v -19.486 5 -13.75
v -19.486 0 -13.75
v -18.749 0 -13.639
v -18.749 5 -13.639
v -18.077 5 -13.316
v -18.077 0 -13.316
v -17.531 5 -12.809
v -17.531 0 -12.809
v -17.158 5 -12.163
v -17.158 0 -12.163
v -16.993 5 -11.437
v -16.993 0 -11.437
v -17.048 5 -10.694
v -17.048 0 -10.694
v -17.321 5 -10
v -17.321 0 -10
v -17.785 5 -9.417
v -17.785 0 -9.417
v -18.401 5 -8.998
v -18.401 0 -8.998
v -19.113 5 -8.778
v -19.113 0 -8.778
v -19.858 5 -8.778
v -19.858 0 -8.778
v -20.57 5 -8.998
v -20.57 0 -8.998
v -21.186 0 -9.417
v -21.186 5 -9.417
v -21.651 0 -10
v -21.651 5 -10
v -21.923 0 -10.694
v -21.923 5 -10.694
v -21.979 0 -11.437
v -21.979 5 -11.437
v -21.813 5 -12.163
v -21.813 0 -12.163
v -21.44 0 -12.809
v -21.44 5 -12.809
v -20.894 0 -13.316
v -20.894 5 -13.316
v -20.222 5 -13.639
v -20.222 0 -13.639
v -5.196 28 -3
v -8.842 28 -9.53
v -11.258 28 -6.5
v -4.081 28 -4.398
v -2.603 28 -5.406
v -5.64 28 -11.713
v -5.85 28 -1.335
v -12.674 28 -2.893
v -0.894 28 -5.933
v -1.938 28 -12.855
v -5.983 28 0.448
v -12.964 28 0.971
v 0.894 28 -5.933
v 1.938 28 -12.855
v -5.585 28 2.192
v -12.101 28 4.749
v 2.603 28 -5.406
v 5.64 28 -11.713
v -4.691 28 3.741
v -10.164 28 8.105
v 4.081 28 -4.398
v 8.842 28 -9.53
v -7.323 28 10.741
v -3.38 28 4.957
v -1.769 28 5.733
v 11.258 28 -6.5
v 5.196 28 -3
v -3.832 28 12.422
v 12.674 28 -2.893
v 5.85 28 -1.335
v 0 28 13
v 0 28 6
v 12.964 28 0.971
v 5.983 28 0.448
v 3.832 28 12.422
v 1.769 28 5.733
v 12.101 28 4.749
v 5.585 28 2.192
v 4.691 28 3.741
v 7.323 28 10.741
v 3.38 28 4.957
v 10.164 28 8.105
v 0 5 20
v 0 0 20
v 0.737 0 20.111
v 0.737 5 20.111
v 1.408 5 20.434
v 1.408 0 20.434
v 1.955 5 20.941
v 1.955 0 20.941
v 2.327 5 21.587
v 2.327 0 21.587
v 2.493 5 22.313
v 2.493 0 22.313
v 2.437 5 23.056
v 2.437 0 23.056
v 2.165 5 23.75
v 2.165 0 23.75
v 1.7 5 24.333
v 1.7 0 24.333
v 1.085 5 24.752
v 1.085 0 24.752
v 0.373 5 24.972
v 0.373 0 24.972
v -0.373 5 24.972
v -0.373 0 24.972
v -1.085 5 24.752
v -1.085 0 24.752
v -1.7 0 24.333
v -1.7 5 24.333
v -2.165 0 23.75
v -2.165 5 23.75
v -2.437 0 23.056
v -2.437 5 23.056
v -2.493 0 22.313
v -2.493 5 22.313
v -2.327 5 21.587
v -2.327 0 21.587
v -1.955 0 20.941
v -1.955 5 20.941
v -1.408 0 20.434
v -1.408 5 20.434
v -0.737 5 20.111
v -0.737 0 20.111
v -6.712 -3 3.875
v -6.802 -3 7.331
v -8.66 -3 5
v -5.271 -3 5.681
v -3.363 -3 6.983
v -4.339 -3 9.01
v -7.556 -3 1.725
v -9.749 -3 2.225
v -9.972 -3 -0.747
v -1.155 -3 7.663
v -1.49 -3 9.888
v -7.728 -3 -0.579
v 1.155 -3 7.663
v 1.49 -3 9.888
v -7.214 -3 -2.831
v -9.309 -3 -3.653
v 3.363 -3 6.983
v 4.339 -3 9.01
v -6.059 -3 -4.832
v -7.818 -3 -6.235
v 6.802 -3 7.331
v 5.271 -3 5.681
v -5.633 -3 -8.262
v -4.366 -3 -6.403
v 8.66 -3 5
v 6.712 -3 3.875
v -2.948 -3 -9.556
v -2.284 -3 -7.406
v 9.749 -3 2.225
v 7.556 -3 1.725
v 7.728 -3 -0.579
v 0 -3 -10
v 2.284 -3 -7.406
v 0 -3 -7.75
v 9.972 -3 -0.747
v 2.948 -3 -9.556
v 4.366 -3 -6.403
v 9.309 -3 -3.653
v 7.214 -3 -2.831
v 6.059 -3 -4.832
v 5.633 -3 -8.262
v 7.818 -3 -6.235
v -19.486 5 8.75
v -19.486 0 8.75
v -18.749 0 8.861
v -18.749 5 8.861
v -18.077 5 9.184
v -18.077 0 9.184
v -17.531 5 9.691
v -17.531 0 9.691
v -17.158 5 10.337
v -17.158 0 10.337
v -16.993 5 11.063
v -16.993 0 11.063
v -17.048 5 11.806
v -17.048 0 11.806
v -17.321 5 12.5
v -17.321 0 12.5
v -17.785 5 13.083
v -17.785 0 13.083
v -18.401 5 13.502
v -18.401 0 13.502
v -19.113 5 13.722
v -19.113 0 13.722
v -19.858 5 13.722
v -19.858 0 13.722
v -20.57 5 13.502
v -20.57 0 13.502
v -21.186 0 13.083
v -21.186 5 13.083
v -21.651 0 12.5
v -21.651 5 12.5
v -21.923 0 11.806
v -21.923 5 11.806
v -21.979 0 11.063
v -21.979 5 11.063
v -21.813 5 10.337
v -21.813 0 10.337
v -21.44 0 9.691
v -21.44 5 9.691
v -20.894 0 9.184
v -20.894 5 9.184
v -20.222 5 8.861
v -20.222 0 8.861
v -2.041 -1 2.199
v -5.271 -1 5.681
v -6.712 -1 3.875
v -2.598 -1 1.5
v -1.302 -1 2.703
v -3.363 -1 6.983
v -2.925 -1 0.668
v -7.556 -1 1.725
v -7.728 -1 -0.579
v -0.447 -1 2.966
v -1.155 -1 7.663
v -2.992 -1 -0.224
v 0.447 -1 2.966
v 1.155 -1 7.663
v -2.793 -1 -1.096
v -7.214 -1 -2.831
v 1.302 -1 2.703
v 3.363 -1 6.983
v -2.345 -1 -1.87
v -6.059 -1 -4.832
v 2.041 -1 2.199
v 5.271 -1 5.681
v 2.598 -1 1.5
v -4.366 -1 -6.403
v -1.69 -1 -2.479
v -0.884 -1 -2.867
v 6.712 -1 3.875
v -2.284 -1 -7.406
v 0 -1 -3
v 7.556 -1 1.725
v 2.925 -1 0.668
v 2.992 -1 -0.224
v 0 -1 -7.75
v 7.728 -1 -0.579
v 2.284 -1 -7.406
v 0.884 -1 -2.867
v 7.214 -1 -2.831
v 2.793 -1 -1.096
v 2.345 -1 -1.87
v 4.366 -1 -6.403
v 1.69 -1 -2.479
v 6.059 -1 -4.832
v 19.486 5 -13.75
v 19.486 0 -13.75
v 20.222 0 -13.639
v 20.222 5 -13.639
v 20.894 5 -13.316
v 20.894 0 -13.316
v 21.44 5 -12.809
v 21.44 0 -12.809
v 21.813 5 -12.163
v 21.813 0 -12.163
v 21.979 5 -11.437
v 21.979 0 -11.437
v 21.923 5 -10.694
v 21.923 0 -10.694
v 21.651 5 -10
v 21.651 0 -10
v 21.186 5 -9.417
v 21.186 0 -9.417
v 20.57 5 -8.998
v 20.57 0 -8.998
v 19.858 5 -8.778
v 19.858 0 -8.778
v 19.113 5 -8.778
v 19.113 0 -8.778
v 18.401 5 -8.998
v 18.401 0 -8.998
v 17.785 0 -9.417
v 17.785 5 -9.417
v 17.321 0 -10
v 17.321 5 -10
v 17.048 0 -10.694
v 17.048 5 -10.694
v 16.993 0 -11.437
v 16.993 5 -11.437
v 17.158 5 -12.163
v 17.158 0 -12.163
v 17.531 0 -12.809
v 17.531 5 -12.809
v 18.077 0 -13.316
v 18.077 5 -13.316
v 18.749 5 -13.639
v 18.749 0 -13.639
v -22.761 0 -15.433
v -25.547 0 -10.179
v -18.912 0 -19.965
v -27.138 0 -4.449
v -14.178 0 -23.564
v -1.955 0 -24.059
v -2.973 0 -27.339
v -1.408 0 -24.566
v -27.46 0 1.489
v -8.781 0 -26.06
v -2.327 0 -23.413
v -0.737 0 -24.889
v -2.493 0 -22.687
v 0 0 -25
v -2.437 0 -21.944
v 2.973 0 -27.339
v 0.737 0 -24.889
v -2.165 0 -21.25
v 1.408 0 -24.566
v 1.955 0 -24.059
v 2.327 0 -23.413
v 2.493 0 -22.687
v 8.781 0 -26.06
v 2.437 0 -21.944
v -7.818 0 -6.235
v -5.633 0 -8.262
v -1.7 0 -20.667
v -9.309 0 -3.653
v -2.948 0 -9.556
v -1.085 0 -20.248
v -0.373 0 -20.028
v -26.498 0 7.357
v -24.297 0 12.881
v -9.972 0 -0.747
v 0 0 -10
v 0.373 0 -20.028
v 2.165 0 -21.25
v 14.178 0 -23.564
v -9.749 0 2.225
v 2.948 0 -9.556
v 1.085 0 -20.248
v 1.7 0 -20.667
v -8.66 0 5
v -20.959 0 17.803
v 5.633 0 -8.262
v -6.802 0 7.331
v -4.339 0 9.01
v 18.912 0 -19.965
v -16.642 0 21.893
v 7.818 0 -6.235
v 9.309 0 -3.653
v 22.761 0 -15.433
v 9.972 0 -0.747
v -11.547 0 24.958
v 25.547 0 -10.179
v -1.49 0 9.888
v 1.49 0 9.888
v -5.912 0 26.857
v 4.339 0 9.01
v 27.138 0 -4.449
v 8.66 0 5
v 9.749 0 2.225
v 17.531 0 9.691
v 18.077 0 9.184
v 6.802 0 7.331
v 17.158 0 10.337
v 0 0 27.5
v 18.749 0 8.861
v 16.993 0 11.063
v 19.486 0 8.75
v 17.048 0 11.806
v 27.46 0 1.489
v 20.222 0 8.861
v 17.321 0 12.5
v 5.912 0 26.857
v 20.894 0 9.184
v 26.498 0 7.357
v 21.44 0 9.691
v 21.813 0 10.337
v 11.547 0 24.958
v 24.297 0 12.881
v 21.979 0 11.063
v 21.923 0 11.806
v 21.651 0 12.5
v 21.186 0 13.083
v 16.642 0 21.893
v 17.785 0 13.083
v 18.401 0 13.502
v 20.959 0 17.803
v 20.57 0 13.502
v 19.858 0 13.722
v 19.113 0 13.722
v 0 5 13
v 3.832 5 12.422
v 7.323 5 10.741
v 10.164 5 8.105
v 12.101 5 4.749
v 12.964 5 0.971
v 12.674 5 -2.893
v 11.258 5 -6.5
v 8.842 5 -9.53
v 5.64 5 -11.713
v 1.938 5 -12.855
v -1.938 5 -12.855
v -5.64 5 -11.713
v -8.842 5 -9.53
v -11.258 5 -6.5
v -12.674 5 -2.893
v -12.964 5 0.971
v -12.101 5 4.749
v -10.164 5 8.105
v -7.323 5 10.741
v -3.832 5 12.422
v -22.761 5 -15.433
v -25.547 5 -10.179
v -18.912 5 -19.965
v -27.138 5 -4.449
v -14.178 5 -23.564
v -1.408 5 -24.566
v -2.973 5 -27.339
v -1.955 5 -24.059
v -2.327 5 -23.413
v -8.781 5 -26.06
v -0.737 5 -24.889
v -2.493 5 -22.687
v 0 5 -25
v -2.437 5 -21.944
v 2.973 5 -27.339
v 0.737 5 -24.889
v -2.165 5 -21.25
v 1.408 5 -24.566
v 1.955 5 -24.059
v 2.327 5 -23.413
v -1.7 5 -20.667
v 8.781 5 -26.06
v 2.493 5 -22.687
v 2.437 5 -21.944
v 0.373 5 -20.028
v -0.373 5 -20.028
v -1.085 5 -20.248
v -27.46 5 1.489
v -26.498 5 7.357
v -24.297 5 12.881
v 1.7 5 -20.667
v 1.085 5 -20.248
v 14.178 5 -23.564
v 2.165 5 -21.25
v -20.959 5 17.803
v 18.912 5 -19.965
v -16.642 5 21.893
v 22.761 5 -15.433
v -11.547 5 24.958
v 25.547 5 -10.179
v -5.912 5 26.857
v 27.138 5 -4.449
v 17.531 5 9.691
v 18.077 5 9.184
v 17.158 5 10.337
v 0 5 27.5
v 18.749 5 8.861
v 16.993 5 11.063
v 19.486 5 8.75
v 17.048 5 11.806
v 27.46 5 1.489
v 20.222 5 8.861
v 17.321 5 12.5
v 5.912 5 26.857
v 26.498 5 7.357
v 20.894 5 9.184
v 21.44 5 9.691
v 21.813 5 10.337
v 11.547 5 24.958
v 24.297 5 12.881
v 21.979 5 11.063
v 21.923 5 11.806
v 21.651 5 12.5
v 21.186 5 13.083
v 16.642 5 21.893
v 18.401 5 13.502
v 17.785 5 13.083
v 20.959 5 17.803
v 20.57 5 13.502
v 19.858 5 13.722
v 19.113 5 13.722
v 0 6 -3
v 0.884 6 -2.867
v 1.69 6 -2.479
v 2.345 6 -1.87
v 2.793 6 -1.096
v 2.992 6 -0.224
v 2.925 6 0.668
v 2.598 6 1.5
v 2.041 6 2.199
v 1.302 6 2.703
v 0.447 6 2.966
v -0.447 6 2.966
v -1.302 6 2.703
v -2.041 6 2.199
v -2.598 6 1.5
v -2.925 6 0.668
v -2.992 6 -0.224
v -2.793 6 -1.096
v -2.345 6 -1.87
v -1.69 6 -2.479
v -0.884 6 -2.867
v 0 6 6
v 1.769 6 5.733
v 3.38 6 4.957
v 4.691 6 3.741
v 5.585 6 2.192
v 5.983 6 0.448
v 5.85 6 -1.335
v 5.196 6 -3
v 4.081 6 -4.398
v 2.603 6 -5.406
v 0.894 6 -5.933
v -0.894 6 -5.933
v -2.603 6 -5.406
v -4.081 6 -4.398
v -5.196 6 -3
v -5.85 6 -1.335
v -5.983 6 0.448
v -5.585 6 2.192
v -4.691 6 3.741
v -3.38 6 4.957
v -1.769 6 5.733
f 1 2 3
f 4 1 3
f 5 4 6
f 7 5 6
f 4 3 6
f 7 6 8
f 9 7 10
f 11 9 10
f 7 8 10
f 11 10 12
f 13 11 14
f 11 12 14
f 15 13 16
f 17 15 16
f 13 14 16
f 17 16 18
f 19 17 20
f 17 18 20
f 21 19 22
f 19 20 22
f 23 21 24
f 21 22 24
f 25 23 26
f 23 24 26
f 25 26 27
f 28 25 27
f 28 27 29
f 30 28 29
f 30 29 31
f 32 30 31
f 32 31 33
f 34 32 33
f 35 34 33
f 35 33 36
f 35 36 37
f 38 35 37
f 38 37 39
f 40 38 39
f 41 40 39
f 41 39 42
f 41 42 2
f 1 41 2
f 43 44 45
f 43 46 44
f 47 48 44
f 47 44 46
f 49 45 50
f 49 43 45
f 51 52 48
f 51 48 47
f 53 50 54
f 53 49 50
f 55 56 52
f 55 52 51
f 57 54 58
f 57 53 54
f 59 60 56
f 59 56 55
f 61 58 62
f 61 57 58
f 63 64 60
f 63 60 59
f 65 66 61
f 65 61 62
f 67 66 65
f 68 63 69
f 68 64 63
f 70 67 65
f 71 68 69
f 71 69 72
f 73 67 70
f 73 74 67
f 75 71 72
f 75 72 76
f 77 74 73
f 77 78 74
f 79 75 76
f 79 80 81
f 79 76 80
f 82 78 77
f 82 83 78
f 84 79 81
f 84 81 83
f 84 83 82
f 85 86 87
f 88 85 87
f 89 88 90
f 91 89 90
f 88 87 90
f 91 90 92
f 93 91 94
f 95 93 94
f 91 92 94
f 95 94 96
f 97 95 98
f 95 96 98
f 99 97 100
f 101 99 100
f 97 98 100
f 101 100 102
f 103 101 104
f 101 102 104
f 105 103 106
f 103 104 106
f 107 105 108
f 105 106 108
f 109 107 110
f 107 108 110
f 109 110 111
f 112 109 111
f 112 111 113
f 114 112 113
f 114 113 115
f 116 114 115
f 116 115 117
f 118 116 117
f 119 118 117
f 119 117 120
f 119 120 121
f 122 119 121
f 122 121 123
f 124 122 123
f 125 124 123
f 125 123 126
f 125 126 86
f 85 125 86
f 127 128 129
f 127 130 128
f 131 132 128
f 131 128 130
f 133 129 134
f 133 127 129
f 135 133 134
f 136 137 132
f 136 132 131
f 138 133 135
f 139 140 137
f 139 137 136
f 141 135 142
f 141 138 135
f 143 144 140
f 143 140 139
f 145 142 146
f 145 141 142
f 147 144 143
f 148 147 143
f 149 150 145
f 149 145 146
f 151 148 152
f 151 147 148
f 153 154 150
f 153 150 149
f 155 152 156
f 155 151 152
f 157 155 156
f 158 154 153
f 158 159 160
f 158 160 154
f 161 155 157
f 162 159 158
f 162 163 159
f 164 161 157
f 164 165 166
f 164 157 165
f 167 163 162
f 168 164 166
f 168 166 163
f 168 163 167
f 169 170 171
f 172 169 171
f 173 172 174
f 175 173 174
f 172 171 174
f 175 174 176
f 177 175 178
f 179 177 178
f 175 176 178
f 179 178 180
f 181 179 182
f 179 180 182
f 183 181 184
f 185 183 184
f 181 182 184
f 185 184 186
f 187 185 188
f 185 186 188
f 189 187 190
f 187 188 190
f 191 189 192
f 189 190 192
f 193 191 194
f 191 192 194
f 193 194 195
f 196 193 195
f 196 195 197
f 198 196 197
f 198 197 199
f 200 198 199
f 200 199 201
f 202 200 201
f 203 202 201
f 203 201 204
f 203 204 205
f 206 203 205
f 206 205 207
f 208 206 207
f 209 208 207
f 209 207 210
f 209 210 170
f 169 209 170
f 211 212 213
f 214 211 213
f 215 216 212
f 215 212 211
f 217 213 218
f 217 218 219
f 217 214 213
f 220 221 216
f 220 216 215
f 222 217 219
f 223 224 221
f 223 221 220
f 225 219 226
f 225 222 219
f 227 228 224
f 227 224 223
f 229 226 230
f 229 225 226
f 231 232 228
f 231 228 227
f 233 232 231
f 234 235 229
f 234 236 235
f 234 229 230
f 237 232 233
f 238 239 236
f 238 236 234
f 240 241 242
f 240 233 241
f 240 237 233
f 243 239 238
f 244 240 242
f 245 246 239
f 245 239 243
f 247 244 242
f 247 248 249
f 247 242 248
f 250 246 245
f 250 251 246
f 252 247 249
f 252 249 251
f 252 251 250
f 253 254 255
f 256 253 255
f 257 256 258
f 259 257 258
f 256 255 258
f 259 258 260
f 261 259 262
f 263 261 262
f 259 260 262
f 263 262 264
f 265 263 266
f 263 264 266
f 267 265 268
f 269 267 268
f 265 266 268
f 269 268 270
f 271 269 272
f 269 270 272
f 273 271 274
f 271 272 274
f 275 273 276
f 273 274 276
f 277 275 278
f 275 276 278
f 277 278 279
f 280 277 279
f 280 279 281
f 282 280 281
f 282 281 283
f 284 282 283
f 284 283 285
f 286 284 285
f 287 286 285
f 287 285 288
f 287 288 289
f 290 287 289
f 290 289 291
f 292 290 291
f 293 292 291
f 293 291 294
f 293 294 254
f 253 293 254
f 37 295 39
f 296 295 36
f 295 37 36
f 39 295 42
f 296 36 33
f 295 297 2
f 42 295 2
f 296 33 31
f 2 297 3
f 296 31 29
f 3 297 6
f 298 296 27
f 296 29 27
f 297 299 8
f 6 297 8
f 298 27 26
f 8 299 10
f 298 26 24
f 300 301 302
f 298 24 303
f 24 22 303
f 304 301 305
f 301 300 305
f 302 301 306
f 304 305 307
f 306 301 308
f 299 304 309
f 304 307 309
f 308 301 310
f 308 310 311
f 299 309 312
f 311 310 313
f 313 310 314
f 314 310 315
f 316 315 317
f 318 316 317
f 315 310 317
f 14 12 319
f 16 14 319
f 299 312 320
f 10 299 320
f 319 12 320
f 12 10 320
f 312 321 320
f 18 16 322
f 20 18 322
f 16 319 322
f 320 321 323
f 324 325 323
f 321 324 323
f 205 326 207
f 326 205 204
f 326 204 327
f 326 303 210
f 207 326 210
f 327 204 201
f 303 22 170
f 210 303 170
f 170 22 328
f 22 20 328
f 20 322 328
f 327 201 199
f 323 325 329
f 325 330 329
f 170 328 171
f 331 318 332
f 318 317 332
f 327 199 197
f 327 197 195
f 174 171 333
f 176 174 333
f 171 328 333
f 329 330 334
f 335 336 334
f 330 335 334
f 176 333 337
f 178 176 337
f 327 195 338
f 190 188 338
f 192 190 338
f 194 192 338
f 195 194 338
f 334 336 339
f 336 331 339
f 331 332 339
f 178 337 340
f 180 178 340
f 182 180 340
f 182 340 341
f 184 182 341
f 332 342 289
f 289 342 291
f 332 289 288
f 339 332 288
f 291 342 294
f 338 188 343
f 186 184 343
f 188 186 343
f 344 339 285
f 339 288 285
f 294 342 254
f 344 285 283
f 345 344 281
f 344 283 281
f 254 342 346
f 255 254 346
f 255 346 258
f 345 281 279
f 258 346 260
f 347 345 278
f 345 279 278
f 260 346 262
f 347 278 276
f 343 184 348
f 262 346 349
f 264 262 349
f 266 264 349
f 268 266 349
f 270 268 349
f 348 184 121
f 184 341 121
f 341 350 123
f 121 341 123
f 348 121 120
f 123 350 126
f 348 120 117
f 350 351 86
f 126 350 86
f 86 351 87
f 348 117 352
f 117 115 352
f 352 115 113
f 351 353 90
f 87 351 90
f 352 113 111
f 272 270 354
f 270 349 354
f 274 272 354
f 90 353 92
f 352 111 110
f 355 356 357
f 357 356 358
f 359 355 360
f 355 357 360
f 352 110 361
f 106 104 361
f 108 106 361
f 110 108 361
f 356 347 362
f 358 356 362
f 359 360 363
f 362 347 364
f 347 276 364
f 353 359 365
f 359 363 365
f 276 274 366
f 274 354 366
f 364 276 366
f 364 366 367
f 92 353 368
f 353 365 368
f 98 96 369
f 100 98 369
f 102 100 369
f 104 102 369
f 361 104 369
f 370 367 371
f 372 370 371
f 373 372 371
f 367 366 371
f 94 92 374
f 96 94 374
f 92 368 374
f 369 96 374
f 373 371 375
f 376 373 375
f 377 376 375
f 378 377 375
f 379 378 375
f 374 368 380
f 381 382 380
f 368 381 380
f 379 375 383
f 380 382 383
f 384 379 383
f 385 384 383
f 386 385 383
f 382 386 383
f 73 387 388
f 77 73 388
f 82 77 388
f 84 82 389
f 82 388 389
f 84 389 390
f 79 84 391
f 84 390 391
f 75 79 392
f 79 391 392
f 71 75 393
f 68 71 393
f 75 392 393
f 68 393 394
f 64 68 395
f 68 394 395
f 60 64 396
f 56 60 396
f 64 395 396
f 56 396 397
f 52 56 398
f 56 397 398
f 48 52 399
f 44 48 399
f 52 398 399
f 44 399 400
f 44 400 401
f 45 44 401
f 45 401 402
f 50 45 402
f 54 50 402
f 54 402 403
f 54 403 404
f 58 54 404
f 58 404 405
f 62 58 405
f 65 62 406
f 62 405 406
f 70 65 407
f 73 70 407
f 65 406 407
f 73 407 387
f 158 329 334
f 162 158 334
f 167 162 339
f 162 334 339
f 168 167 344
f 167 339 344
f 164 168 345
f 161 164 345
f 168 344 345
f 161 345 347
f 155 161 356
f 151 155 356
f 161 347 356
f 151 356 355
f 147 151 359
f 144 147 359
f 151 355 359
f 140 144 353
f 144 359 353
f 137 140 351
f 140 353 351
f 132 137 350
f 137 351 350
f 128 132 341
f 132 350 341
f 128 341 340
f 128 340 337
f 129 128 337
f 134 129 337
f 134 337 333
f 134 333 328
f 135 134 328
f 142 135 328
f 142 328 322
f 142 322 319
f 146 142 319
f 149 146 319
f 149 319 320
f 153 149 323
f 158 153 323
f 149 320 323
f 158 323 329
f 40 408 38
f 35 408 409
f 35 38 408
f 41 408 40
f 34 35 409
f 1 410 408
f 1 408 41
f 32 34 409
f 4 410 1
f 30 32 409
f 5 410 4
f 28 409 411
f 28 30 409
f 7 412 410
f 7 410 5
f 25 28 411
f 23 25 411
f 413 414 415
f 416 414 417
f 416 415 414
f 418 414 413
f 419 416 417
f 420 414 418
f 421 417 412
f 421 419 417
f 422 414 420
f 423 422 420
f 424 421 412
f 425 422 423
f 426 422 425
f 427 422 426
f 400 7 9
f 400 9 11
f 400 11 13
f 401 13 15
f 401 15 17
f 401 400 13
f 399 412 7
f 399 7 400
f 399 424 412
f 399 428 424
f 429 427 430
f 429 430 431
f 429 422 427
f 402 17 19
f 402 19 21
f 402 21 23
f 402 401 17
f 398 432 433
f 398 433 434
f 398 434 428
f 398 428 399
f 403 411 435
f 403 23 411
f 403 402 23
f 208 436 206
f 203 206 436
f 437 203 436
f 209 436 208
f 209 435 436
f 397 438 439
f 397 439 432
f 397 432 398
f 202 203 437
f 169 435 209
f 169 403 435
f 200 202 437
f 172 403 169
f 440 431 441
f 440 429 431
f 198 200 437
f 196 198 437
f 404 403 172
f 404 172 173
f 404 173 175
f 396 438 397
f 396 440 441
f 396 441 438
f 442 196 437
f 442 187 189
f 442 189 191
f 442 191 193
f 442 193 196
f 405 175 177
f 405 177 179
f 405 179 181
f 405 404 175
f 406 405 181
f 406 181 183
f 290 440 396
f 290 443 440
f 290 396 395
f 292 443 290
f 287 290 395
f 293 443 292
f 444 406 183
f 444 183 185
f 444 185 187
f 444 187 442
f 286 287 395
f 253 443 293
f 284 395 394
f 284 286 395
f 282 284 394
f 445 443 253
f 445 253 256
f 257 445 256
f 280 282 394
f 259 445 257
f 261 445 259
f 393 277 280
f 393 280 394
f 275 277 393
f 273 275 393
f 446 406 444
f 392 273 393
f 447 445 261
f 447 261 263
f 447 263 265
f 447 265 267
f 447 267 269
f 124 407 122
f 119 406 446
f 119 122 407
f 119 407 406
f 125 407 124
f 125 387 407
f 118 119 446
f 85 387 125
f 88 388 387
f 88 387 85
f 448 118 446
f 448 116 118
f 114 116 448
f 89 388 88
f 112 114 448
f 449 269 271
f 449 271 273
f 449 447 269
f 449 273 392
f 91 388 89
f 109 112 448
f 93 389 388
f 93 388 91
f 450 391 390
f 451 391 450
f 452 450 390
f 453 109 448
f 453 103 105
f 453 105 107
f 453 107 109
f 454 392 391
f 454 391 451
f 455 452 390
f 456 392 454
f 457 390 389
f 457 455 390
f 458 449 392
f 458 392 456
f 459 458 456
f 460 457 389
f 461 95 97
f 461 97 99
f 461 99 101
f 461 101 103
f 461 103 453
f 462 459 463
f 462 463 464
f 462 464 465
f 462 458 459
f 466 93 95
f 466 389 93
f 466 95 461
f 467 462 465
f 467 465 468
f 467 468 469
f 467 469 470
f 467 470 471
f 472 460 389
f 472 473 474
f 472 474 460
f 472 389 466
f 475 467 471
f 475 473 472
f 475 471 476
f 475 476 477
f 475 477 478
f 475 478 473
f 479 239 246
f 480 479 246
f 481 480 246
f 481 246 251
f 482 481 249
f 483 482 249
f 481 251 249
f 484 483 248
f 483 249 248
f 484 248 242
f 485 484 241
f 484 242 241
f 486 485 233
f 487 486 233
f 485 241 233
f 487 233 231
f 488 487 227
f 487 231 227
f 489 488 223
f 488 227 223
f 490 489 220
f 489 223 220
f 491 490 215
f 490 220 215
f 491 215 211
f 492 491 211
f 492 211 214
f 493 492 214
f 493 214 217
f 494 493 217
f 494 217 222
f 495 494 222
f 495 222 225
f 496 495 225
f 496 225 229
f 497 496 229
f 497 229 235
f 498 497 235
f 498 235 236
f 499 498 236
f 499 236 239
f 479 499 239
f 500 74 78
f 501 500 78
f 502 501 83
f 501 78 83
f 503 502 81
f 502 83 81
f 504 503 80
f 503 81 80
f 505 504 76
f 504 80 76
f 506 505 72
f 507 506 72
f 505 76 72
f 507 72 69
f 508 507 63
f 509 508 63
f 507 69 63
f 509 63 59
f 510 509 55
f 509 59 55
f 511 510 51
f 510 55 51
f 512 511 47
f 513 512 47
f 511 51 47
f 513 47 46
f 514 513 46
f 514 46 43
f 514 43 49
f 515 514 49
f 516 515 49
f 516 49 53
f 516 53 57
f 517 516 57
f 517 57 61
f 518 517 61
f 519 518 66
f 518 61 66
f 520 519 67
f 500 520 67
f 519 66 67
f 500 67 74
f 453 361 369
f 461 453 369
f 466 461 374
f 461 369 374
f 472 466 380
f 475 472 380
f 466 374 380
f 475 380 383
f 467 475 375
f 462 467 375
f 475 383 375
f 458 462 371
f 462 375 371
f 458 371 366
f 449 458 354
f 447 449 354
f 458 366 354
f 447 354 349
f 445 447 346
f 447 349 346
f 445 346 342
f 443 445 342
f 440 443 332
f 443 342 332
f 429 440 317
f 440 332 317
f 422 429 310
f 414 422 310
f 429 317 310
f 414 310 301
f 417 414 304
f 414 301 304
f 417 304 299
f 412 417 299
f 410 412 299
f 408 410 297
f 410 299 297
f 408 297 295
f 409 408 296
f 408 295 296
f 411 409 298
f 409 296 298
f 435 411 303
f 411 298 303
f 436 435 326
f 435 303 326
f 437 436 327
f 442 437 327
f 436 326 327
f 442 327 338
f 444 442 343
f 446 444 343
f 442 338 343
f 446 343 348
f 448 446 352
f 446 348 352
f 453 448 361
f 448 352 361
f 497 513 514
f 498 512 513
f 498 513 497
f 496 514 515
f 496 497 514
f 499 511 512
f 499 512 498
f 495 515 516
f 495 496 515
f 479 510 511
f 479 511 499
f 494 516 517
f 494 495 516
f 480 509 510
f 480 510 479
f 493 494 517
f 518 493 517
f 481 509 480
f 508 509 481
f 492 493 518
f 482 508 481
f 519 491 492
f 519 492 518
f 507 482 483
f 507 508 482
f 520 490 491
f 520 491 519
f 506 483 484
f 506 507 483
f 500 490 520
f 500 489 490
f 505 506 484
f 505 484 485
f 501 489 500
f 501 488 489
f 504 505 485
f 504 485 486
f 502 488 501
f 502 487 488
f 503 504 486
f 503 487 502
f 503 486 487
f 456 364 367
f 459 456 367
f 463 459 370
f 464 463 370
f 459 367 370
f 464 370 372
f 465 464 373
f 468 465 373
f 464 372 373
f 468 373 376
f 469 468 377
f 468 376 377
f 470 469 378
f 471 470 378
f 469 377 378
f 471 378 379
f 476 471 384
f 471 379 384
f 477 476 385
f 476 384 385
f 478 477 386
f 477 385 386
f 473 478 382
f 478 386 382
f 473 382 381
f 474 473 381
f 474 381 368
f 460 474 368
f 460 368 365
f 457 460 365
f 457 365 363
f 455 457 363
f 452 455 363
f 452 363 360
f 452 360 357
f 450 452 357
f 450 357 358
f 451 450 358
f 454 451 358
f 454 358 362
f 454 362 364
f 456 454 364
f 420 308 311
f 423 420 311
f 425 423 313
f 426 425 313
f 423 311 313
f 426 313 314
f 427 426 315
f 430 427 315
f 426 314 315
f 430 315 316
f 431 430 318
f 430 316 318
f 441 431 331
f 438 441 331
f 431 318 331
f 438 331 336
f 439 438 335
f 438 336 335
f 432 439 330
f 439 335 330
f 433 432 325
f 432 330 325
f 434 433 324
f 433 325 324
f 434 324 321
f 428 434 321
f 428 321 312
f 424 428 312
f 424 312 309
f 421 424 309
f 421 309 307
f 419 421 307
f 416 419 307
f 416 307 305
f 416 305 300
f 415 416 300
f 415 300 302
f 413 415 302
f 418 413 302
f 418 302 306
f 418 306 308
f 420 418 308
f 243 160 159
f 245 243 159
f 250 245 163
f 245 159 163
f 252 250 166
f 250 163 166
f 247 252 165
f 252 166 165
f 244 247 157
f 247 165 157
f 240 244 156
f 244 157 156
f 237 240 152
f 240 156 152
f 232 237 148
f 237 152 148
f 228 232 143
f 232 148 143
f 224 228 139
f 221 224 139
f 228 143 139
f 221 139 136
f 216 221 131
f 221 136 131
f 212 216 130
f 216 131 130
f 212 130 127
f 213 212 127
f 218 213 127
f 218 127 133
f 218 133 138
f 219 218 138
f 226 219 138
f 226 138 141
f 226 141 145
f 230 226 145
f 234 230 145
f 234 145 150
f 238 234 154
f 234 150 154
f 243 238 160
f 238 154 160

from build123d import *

# Parameters (mm, degrees)
SKETCH_1_R          = 27.5
EXTRUDE_1_DEPTH     = 5
SKETCH_2_R          = 10
EXTRUDE_2_DEPTH     = 3
SKETCH_3_R          = 13
EXTRUDE_3_DEPTH     = 23
SKETCH_4_R          = 6
CUT_EXTRUDE_1_DEPTH = 22
SKETCH_5_R          = 7.75
CUT_EXTRUDE_2_DEPTH = 2
SKETCH_6_R          = 3
CUT_EXTRUDE_3_DEPTH = 49.512884886
SKETCH_7_R          = 2.5
CUT_EXTRUDE_4_DEPTH = 48.921811318


with BuildPart() as part:
    # 草图1 → 凸台-拉伸1 (new body)
    with BuildSketch(Plane(origin=(0, 0, 0), x_dir=(1, 0, 0), z_dir=(0, 1, 0))):
        with Locations(Location((0, 0, 0), (0, 0, 270))):
            Circle(SKETCH_1_R)
    extrude(amount=EXTRUDE_1_DEPTH)

    # 草图2 → 凸台-拉伸2 (add)
    with BuildSketch(Plane.XZ):
        with Locations(Location((0, 0, 0), (0, 0, 270))):
            Circle(SKETCH_2_R)
    extrude(amount=EXTRUDE_2_DEPTH)

    # 草图3 → 凸台-拉伸3 (add)
    with BuildSketch(Plane(origin=(0, 5, 0), x_dir=(1, 0, 0), z_dir=(0, 1, 0))):
        with Locations(Location((0, 0, 0), (0, 0, 270))):
            Circle(SKETCH_3_R)
    extrude(amount=EXTRUDE_3_DEPTH)

    # 草图4 → 切除-拉伸1 (cut)
    with BuildSketch(Plane(origin=(0, 28, 0), x_dir=(1, 0, 0), z_dir=(0, 1, 0))):
        with Locations(Location((0, 0, 0), (0, 0, 270))):
            Circle(SKETCH_4_R)
    extrude(amount=-CUT_EXTRUDE_1_DEPTH, mode=Mode.SUBTRACT)

    # 草图5 → 切除-拉伸2 (cut)
    with BuildSketch(Plane.XZ.offset(3)):
        with Locations(Location((0, 0, 0), (0, 0, 270))):
            Circle(SKETCH_5_R)
    extrude(amount=-CUT_EXTRUDE_2_DEPTH, mode=Mode.SUBTRACT)

    # 草图6 → 切除-拉伸3 (cut, through all)
    with BuildSketch(Plane.XZ.offset(1)):
        with Locations(Location((0, 0, 0), (0, 0, 270))):
            Circle(SKETCH_6_R)
    extrude(amount=-CUT_EXTRUDE_3_DEPTH, mode=Mode.SUBTRACT)

    # 草图7 → 切除-拉伸4 (cut, through all)
    with BuildSketch(Plane.XZ):
        with Locations(Location((0, 22.5, 0), (0, 0, 270))):
            Circle(SKETCH_7_R)
        with Locations(Location((19.485571585, 11.25, 0), (0, 0, 270))):
            Circle(SKETCH_7_R)
        with Locations(Location((19.485571585, -11.25, 0), (0, 0, 270))):
            Circle(SKETCH_7_R)
        with Locations(Location((0, -22.5, 0), (0, 0, 270))):
            Circle(SKETCH_7_R)
        with Locations(Location((-19.485571585, -11.25, 0), (0, 0, 270))):
            Circle(SKETCH_7_R)
        with Locations(Location((-19.485571585, 11.25, 0), (0, 0, 270))):
            Circle(SKETCH_7_R)
    extrude(amount=-CUT_EXTRUDE_4_DEPTH, mode=Mode.SUBTRACT)


solid = part.part
